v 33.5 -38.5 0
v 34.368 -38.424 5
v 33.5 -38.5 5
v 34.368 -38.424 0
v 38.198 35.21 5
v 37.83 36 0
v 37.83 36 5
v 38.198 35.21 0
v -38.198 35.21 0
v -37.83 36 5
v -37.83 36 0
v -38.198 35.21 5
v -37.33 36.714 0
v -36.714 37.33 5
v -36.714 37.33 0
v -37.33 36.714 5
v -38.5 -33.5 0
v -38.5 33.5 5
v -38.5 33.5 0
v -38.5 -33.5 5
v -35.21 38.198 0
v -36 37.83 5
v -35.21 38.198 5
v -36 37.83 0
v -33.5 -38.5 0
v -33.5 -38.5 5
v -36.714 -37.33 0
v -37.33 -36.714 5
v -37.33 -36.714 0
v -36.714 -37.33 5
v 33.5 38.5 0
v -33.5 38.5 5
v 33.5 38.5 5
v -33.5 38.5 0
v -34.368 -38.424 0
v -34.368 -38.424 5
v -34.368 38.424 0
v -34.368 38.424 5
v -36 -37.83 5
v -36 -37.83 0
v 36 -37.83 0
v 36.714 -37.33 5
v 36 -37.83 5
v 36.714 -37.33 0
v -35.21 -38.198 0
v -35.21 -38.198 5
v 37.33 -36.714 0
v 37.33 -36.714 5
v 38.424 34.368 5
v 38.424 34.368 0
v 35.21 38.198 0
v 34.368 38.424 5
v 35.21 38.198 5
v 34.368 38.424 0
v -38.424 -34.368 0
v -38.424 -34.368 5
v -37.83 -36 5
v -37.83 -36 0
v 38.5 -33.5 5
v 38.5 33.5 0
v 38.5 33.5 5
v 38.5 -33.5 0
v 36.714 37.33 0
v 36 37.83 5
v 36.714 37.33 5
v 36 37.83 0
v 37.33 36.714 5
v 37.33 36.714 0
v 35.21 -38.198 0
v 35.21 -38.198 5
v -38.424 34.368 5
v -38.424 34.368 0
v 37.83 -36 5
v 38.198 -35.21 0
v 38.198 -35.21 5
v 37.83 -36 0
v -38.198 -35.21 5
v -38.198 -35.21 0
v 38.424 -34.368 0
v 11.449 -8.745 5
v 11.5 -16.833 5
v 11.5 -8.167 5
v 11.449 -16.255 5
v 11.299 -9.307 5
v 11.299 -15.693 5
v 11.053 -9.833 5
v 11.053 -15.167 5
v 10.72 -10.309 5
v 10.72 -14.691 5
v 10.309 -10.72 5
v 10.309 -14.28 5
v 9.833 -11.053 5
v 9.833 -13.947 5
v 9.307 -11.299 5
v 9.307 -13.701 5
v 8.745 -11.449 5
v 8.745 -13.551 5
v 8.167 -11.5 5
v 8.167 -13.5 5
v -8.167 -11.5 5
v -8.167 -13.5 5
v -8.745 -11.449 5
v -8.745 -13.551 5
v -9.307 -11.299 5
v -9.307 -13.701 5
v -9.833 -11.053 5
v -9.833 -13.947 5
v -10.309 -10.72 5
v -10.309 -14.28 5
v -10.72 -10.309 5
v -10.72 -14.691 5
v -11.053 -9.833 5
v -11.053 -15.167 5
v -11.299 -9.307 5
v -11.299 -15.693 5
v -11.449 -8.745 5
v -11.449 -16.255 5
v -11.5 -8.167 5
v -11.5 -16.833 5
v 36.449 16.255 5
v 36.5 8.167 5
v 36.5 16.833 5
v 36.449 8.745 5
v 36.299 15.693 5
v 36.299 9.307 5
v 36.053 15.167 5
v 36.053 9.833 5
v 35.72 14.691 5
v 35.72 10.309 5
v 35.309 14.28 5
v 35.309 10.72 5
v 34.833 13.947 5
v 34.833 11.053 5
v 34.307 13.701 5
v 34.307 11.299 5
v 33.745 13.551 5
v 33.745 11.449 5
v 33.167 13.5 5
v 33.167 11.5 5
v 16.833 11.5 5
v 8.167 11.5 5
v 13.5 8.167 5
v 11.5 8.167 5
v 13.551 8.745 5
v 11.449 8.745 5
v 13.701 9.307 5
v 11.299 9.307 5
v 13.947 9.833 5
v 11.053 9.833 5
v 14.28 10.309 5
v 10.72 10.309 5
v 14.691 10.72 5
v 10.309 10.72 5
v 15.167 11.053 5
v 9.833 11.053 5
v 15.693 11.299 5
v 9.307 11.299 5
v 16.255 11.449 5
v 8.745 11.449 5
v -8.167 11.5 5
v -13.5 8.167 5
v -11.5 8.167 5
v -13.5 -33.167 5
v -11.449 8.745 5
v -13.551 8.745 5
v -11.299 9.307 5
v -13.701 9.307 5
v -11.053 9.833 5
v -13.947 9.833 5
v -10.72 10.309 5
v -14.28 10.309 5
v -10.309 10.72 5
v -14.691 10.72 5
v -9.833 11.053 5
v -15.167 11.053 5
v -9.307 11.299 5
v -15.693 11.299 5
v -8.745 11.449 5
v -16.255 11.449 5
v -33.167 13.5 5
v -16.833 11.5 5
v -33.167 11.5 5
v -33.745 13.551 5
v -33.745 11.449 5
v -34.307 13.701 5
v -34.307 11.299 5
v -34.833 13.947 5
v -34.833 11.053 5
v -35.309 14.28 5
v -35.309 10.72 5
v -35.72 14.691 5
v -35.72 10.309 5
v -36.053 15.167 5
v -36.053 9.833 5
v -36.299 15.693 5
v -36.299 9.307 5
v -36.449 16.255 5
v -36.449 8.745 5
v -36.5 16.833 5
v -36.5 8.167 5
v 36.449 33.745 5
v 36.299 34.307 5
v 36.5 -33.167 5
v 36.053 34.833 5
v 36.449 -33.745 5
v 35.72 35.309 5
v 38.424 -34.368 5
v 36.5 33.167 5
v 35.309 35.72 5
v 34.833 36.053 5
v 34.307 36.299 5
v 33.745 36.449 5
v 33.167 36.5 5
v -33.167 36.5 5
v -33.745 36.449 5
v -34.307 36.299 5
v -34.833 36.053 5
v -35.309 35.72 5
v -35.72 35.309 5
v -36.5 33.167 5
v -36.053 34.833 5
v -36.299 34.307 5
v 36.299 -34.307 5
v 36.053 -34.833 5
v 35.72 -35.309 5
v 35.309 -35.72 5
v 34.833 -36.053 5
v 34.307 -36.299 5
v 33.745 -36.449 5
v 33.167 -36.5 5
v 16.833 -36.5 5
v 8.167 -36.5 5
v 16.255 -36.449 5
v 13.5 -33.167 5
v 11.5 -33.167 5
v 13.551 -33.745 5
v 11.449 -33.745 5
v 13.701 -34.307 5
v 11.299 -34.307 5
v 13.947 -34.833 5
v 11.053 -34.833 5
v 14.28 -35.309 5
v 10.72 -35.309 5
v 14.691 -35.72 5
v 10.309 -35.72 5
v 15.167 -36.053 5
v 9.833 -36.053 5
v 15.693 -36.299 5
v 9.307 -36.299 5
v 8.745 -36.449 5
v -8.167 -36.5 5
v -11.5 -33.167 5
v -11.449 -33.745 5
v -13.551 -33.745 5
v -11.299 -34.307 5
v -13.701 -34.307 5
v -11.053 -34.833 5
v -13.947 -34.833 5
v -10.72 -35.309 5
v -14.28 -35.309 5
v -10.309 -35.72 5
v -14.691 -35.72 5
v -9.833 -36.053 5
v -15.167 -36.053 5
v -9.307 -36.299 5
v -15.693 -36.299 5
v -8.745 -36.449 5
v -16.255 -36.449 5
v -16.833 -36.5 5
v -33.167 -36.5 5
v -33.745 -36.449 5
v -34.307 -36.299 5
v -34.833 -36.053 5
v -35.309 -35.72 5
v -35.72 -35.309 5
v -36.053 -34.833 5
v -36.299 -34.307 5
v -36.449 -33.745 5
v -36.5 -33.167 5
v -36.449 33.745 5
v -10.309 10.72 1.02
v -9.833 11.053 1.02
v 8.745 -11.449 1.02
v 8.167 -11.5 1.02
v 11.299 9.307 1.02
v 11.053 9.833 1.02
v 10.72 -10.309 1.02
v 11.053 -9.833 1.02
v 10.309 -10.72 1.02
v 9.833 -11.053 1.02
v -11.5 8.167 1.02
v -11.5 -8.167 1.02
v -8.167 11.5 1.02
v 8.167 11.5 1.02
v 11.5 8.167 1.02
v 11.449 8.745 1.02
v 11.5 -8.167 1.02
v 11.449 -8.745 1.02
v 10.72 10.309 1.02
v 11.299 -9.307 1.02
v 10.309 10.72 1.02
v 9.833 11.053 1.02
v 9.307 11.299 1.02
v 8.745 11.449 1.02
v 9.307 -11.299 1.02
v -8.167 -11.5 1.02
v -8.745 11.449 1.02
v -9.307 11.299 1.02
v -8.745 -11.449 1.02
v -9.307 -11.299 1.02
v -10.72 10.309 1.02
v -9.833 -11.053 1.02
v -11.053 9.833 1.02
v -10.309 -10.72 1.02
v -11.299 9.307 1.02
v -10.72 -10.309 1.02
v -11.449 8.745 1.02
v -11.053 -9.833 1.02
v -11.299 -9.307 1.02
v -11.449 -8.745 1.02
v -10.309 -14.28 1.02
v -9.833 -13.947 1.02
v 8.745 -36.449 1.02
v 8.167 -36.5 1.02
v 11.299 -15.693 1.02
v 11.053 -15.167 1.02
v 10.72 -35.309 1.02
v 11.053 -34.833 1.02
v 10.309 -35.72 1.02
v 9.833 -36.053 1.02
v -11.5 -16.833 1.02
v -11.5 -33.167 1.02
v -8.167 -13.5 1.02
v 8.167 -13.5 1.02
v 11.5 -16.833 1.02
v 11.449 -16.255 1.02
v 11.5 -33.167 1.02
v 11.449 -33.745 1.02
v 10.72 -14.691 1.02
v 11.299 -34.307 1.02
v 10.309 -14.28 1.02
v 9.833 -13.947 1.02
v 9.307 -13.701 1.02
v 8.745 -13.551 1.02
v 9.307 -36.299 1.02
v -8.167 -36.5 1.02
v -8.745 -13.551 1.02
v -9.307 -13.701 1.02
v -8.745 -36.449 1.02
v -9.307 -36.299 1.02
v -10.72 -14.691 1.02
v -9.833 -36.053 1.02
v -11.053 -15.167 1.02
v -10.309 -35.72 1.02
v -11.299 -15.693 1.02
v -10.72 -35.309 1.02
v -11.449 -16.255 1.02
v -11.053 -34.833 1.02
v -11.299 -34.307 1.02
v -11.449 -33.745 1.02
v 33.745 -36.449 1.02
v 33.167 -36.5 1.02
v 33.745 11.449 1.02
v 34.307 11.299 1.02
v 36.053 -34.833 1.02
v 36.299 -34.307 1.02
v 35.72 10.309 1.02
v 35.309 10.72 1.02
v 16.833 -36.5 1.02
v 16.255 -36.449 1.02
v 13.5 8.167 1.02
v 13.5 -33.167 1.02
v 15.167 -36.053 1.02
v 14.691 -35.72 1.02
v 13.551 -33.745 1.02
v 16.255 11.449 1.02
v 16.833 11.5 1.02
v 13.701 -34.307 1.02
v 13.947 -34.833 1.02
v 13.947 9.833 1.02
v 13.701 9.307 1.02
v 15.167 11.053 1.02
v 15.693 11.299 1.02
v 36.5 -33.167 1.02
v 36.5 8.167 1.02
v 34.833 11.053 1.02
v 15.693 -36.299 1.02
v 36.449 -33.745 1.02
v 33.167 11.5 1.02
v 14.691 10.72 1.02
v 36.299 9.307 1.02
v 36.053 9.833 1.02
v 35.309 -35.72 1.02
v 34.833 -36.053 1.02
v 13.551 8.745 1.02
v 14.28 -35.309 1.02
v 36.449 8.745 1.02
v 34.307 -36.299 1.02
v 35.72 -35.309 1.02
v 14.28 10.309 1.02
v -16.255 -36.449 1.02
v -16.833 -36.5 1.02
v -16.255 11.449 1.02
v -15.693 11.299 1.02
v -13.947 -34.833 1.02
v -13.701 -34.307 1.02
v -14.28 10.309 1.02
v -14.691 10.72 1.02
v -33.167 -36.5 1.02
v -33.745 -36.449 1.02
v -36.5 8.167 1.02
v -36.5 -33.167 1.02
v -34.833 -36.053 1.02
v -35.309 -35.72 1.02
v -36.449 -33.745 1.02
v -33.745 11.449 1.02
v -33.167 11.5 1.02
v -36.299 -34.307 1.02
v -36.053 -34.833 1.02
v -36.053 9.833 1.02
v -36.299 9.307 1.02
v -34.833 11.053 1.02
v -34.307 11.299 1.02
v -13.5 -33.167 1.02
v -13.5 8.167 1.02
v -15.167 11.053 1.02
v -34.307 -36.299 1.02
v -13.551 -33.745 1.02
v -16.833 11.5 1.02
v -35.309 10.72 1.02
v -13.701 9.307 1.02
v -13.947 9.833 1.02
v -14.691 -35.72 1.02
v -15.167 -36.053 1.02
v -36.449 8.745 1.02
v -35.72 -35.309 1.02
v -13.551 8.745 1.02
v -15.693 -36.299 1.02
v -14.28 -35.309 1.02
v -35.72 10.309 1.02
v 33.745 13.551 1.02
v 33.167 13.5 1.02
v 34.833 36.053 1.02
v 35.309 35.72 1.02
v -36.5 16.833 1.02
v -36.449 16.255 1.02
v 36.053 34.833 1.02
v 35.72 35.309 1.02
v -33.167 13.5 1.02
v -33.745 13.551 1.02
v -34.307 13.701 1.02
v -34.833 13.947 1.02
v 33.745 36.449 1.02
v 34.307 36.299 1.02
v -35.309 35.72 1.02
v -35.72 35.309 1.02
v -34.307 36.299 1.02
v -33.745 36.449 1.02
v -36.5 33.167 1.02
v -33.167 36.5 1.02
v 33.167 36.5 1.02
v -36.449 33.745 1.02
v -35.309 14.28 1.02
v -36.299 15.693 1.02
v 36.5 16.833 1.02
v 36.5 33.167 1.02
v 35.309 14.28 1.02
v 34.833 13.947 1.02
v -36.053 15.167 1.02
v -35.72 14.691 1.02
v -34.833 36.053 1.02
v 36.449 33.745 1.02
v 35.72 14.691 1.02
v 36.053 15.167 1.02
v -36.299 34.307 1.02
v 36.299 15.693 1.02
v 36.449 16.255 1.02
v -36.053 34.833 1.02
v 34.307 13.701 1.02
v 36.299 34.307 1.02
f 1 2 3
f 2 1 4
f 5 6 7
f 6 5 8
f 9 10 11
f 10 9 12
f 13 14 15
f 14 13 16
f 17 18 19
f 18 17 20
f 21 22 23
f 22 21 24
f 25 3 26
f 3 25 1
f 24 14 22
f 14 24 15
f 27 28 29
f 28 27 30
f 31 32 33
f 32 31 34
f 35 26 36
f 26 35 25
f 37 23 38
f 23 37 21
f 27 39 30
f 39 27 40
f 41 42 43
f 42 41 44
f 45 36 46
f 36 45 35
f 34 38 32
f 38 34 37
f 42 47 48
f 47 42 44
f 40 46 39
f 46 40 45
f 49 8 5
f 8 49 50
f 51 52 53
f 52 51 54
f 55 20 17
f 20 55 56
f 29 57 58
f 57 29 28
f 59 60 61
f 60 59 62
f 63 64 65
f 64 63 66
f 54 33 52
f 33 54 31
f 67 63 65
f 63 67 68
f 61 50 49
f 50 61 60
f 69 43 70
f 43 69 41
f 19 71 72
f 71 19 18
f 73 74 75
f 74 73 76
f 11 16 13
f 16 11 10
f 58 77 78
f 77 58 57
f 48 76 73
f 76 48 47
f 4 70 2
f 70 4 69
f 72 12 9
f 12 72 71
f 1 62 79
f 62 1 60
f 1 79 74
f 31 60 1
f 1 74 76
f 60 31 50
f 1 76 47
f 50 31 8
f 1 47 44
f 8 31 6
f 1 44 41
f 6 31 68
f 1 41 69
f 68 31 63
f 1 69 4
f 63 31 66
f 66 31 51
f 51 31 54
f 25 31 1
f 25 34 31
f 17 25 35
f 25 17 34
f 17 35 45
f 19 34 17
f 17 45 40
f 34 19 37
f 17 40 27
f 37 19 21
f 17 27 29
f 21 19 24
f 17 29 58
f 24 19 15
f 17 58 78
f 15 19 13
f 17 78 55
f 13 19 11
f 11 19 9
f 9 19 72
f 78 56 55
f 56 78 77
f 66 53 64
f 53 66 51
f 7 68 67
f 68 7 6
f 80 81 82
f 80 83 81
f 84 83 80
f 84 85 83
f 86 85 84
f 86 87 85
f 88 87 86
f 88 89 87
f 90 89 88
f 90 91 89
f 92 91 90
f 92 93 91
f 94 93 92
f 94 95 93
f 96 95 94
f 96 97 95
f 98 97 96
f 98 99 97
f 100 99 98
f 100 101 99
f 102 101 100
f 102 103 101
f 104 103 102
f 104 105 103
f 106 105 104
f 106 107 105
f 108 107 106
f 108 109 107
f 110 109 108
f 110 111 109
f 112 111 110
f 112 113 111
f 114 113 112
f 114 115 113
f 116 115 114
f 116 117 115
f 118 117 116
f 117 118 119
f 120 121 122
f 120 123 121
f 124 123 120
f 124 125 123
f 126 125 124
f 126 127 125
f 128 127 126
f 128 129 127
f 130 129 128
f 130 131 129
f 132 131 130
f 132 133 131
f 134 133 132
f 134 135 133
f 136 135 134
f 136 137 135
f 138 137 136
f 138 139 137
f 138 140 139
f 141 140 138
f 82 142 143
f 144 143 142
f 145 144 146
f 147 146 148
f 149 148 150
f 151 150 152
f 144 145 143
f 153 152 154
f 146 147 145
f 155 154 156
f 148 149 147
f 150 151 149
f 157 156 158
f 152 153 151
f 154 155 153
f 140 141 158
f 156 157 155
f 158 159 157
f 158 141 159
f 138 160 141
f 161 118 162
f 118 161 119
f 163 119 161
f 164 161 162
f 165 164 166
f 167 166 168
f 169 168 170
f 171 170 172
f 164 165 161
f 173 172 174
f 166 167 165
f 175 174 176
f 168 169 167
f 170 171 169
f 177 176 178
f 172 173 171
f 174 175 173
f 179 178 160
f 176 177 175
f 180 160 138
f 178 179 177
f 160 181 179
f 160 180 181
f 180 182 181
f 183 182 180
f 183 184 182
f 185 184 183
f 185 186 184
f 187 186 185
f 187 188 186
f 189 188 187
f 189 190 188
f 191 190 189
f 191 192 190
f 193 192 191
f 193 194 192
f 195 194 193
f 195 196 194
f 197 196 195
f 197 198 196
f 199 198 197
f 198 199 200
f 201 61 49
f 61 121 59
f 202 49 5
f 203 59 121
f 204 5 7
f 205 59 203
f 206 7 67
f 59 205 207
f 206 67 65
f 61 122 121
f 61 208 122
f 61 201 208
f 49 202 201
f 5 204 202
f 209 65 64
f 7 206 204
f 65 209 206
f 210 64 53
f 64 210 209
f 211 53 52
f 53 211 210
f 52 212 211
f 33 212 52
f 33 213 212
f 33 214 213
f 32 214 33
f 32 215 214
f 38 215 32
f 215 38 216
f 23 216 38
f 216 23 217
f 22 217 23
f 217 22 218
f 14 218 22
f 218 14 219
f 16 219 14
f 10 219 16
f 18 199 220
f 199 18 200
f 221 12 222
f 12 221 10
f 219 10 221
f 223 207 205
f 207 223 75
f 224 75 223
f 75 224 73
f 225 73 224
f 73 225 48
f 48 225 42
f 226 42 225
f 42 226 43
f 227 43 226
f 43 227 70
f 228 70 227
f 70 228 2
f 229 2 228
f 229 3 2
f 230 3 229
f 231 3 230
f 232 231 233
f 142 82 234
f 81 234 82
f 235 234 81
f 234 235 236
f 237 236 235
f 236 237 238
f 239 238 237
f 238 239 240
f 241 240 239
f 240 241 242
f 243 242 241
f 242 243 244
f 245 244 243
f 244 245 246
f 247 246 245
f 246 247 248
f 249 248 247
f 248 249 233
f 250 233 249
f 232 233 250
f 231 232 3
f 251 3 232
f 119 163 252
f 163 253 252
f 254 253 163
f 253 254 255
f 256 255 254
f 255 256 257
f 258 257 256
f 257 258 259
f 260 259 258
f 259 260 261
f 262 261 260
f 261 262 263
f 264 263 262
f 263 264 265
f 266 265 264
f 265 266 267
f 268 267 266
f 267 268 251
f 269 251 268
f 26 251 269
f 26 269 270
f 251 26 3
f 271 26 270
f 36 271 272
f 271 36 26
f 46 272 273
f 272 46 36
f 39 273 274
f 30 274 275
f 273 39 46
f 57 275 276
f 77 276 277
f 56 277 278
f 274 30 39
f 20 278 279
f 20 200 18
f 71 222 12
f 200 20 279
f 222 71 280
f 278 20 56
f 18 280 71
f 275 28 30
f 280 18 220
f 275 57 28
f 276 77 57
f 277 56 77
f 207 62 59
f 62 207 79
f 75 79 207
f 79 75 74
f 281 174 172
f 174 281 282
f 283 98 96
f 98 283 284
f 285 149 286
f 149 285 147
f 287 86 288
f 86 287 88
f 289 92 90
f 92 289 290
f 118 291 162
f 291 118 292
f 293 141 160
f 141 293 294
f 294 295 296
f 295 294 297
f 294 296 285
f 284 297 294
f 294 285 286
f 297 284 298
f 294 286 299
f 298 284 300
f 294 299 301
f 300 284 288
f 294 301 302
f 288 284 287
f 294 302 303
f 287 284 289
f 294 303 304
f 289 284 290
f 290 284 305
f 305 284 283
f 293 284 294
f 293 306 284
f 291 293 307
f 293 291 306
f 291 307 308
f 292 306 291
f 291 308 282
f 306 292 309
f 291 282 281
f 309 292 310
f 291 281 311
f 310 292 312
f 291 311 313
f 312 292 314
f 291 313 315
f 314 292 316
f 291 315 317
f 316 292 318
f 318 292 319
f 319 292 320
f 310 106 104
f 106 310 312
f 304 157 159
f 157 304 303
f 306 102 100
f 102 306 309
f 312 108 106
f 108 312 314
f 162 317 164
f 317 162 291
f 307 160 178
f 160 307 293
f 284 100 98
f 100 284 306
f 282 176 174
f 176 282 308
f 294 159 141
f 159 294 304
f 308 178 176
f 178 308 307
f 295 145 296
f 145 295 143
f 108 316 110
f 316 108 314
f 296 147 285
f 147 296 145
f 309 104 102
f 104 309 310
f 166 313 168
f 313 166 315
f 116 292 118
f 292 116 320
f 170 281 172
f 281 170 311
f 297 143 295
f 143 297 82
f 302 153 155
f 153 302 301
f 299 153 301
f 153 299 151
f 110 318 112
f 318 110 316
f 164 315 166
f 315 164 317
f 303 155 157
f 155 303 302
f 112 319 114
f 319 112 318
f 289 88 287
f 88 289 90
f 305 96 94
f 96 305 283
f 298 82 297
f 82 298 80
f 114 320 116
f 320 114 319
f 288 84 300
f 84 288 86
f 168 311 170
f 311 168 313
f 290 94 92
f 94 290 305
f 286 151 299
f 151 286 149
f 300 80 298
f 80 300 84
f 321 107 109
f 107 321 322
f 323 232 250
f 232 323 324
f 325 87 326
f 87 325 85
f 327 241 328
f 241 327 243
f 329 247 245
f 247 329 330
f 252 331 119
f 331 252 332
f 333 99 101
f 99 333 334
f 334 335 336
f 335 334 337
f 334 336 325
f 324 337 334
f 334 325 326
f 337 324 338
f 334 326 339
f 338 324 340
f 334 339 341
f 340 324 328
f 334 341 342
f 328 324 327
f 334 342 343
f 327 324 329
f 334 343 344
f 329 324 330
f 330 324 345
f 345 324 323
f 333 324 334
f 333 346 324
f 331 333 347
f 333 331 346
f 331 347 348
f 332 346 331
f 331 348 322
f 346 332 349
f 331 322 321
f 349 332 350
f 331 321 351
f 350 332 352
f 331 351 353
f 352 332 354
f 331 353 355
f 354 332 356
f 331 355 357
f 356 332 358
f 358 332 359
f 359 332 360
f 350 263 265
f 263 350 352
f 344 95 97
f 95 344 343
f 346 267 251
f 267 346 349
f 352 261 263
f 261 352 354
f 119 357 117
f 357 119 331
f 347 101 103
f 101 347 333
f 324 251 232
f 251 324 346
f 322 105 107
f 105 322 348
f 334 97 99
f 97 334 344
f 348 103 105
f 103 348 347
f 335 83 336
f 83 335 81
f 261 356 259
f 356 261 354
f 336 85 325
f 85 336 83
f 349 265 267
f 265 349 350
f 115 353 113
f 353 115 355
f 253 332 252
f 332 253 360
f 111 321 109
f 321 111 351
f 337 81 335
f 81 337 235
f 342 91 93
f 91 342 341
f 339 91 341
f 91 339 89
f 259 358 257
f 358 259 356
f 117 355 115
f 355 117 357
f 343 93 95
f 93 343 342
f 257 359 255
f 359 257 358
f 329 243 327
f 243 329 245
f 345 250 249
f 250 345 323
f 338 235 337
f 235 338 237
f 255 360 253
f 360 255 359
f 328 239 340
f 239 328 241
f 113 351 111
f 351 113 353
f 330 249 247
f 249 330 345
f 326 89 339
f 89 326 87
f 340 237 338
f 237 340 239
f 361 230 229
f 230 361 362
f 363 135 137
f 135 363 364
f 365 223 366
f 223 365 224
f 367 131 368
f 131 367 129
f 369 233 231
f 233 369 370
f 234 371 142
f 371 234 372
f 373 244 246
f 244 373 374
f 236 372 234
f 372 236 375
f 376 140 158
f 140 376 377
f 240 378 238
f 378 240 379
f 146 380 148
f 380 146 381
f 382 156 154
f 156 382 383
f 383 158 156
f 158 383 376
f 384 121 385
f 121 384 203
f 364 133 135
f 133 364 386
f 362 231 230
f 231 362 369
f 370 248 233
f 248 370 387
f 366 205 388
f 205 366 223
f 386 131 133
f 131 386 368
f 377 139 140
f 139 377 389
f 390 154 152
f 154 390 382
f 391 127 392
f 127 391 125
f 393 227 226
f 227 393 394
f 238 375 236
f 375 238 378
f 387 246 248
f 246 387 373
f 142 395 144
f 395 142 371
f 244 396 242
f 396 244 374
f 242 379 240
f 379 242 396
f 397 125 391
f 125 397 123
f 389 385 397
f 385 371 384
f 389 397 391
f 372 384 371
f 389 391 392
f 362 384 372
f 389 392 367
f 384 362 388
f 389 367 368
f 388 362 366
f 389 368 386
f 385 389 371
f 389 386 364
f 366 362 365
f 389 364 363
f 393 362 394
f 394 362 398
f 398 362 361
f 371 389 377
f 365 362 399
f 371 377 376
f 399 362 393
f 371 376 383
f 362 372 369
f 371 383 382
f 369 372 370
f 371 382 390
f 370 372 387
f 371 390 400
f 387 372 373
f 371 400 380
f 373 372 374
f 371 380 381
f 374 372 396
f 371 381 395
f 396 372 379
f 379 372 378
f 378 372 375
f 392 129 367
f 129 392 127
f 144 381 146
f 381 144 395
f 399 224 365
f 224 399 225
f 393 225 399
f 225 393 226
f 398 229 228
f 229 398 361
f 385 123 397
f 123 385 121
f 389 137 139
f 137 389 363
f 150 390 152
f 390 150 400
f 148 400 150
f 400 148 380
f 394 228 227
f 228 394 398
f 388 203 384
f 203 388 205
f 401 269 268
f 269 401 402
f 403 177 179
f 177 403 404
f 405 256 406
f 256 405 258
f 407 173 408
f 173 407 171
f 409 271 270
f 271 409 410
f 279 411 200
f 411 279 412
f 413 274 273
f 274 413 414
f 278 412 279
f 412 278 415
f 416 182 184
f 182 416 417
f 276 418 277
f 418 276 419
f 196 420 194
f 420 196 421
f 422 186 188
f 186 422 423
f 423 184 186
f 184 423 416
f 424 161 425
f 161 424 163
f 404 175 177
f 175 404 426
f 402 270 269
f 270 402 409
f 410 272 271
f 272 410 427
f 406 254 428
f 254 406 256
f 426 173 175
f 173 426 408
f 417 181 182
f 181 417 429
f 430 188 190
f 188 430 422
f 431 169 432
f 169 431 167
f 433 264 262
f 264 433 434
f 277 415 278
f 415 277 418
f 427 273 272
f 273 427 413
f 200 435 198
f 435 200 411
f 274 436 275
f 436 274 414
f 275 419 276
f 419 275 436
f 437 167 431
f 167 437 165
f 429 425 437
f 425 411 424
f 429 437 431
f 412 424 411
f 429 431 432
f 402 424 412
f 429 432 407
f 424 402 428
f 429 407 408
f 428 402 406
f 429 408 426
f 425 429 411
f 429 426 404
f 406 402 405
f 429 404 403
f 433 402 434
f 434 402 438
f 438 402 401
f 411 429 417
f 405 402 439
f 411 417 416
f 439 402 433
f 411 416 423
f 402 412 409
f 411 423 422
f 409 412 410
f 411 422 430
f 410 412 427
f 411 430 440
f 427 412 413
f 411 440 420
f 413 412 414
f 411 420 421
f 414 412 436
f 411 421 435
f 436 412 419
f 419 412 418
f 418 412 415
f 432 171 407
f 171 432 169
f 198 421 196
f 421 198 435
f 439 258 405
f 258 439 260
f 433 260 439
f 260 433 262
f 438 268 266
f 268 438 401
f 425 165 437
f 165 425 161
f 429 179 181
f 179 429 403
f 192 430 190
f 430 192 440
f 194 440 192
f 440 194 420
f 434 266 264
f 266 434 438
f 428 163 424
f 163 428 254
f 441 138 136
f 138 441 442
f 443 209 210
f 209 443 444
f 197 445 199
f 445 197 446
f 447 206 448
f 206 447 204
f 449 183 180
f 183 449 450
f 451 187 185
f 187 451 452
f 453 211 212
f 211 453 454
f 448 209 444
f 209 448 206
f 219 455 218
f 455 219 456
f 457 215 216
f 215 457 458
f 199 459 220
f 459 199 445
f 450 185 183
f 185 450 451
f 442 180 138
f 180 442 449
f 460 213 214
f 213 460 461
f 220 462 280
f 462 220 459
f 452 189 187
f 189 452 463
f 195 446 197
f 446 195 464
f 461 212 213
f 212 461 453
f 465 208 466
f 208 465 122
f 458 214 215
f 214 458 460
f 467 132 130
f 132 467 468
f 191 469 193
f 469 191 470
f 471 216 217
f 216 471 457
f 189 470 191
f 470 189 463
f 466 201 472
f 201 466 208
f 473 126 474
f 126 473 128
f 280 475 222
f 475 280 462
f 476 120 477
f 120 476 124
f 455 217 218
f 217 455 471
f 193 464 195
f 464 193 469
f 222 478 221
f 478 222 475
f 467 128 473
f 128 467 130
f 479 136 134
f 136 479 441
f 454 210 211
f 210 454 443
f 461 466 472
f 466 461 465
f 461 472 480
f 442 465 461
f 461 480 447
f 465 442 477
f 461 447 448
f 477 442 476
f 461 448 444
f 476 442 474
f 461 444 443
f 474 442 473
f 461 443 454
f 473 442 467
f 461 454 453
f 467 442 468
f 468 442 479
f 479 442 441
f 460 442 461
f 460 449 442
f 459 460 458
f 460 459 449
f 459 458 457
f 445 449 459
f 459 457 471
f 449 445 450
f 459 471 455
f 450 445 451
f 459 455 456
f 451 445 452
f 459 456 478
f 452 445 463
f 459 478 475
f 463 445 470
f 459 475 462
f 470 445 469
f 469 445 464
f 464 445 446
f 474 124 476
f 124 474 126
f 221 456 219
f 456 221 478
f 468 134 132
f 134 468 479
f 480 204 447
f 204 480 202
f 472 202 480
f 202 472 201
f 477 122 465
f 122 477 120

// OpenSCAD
side = 75;
height = 5;
depth = 4;
rounding = 5;
wall = 4;

E = 0.02;

module _round(r) {
    $fn = 36;

    offset(r)
    offset(- r)
        children();
}


module base() {
    linear_extrude(height)
    _round(rounding)
        square([side, side] + [wall, wall] / 2, center = true);
}


module compartment(dim) {
    module shape() {
        linear_extrude(dim.z)
        _round(rounding * 2/3)
            square([dim.x, dim.y], center = true);
    }

    translate([0, 0, height - dim.z + E])
        shape();
}


module compartment_1x1() {
    compartment([side / 3, side / 3, depth] - [wall, wall, 0] / 2);
}

module compartment_1x2() {
    compartment([side / 3, side * 2 / 3, depth] - [wall, wall, 0] / 2);
}

module compartment_3x1() {
    compartment([side, side / 3, depth] - [wall, wall, 0] / 2);
}


module tray() {
    difference() {
        base();

        compartment_1x1();

        translate([0, - side / 3, 0])
            compartment_1x1();

        translate([side / 3, - side / 6, 0])
            compartment_1x2();

        translate([- side / 3, - side / 6, 0])
            compartment_1x2();

        translate([0, side / 3, 0])
            compartment_3x1();
    }
}


tray();
